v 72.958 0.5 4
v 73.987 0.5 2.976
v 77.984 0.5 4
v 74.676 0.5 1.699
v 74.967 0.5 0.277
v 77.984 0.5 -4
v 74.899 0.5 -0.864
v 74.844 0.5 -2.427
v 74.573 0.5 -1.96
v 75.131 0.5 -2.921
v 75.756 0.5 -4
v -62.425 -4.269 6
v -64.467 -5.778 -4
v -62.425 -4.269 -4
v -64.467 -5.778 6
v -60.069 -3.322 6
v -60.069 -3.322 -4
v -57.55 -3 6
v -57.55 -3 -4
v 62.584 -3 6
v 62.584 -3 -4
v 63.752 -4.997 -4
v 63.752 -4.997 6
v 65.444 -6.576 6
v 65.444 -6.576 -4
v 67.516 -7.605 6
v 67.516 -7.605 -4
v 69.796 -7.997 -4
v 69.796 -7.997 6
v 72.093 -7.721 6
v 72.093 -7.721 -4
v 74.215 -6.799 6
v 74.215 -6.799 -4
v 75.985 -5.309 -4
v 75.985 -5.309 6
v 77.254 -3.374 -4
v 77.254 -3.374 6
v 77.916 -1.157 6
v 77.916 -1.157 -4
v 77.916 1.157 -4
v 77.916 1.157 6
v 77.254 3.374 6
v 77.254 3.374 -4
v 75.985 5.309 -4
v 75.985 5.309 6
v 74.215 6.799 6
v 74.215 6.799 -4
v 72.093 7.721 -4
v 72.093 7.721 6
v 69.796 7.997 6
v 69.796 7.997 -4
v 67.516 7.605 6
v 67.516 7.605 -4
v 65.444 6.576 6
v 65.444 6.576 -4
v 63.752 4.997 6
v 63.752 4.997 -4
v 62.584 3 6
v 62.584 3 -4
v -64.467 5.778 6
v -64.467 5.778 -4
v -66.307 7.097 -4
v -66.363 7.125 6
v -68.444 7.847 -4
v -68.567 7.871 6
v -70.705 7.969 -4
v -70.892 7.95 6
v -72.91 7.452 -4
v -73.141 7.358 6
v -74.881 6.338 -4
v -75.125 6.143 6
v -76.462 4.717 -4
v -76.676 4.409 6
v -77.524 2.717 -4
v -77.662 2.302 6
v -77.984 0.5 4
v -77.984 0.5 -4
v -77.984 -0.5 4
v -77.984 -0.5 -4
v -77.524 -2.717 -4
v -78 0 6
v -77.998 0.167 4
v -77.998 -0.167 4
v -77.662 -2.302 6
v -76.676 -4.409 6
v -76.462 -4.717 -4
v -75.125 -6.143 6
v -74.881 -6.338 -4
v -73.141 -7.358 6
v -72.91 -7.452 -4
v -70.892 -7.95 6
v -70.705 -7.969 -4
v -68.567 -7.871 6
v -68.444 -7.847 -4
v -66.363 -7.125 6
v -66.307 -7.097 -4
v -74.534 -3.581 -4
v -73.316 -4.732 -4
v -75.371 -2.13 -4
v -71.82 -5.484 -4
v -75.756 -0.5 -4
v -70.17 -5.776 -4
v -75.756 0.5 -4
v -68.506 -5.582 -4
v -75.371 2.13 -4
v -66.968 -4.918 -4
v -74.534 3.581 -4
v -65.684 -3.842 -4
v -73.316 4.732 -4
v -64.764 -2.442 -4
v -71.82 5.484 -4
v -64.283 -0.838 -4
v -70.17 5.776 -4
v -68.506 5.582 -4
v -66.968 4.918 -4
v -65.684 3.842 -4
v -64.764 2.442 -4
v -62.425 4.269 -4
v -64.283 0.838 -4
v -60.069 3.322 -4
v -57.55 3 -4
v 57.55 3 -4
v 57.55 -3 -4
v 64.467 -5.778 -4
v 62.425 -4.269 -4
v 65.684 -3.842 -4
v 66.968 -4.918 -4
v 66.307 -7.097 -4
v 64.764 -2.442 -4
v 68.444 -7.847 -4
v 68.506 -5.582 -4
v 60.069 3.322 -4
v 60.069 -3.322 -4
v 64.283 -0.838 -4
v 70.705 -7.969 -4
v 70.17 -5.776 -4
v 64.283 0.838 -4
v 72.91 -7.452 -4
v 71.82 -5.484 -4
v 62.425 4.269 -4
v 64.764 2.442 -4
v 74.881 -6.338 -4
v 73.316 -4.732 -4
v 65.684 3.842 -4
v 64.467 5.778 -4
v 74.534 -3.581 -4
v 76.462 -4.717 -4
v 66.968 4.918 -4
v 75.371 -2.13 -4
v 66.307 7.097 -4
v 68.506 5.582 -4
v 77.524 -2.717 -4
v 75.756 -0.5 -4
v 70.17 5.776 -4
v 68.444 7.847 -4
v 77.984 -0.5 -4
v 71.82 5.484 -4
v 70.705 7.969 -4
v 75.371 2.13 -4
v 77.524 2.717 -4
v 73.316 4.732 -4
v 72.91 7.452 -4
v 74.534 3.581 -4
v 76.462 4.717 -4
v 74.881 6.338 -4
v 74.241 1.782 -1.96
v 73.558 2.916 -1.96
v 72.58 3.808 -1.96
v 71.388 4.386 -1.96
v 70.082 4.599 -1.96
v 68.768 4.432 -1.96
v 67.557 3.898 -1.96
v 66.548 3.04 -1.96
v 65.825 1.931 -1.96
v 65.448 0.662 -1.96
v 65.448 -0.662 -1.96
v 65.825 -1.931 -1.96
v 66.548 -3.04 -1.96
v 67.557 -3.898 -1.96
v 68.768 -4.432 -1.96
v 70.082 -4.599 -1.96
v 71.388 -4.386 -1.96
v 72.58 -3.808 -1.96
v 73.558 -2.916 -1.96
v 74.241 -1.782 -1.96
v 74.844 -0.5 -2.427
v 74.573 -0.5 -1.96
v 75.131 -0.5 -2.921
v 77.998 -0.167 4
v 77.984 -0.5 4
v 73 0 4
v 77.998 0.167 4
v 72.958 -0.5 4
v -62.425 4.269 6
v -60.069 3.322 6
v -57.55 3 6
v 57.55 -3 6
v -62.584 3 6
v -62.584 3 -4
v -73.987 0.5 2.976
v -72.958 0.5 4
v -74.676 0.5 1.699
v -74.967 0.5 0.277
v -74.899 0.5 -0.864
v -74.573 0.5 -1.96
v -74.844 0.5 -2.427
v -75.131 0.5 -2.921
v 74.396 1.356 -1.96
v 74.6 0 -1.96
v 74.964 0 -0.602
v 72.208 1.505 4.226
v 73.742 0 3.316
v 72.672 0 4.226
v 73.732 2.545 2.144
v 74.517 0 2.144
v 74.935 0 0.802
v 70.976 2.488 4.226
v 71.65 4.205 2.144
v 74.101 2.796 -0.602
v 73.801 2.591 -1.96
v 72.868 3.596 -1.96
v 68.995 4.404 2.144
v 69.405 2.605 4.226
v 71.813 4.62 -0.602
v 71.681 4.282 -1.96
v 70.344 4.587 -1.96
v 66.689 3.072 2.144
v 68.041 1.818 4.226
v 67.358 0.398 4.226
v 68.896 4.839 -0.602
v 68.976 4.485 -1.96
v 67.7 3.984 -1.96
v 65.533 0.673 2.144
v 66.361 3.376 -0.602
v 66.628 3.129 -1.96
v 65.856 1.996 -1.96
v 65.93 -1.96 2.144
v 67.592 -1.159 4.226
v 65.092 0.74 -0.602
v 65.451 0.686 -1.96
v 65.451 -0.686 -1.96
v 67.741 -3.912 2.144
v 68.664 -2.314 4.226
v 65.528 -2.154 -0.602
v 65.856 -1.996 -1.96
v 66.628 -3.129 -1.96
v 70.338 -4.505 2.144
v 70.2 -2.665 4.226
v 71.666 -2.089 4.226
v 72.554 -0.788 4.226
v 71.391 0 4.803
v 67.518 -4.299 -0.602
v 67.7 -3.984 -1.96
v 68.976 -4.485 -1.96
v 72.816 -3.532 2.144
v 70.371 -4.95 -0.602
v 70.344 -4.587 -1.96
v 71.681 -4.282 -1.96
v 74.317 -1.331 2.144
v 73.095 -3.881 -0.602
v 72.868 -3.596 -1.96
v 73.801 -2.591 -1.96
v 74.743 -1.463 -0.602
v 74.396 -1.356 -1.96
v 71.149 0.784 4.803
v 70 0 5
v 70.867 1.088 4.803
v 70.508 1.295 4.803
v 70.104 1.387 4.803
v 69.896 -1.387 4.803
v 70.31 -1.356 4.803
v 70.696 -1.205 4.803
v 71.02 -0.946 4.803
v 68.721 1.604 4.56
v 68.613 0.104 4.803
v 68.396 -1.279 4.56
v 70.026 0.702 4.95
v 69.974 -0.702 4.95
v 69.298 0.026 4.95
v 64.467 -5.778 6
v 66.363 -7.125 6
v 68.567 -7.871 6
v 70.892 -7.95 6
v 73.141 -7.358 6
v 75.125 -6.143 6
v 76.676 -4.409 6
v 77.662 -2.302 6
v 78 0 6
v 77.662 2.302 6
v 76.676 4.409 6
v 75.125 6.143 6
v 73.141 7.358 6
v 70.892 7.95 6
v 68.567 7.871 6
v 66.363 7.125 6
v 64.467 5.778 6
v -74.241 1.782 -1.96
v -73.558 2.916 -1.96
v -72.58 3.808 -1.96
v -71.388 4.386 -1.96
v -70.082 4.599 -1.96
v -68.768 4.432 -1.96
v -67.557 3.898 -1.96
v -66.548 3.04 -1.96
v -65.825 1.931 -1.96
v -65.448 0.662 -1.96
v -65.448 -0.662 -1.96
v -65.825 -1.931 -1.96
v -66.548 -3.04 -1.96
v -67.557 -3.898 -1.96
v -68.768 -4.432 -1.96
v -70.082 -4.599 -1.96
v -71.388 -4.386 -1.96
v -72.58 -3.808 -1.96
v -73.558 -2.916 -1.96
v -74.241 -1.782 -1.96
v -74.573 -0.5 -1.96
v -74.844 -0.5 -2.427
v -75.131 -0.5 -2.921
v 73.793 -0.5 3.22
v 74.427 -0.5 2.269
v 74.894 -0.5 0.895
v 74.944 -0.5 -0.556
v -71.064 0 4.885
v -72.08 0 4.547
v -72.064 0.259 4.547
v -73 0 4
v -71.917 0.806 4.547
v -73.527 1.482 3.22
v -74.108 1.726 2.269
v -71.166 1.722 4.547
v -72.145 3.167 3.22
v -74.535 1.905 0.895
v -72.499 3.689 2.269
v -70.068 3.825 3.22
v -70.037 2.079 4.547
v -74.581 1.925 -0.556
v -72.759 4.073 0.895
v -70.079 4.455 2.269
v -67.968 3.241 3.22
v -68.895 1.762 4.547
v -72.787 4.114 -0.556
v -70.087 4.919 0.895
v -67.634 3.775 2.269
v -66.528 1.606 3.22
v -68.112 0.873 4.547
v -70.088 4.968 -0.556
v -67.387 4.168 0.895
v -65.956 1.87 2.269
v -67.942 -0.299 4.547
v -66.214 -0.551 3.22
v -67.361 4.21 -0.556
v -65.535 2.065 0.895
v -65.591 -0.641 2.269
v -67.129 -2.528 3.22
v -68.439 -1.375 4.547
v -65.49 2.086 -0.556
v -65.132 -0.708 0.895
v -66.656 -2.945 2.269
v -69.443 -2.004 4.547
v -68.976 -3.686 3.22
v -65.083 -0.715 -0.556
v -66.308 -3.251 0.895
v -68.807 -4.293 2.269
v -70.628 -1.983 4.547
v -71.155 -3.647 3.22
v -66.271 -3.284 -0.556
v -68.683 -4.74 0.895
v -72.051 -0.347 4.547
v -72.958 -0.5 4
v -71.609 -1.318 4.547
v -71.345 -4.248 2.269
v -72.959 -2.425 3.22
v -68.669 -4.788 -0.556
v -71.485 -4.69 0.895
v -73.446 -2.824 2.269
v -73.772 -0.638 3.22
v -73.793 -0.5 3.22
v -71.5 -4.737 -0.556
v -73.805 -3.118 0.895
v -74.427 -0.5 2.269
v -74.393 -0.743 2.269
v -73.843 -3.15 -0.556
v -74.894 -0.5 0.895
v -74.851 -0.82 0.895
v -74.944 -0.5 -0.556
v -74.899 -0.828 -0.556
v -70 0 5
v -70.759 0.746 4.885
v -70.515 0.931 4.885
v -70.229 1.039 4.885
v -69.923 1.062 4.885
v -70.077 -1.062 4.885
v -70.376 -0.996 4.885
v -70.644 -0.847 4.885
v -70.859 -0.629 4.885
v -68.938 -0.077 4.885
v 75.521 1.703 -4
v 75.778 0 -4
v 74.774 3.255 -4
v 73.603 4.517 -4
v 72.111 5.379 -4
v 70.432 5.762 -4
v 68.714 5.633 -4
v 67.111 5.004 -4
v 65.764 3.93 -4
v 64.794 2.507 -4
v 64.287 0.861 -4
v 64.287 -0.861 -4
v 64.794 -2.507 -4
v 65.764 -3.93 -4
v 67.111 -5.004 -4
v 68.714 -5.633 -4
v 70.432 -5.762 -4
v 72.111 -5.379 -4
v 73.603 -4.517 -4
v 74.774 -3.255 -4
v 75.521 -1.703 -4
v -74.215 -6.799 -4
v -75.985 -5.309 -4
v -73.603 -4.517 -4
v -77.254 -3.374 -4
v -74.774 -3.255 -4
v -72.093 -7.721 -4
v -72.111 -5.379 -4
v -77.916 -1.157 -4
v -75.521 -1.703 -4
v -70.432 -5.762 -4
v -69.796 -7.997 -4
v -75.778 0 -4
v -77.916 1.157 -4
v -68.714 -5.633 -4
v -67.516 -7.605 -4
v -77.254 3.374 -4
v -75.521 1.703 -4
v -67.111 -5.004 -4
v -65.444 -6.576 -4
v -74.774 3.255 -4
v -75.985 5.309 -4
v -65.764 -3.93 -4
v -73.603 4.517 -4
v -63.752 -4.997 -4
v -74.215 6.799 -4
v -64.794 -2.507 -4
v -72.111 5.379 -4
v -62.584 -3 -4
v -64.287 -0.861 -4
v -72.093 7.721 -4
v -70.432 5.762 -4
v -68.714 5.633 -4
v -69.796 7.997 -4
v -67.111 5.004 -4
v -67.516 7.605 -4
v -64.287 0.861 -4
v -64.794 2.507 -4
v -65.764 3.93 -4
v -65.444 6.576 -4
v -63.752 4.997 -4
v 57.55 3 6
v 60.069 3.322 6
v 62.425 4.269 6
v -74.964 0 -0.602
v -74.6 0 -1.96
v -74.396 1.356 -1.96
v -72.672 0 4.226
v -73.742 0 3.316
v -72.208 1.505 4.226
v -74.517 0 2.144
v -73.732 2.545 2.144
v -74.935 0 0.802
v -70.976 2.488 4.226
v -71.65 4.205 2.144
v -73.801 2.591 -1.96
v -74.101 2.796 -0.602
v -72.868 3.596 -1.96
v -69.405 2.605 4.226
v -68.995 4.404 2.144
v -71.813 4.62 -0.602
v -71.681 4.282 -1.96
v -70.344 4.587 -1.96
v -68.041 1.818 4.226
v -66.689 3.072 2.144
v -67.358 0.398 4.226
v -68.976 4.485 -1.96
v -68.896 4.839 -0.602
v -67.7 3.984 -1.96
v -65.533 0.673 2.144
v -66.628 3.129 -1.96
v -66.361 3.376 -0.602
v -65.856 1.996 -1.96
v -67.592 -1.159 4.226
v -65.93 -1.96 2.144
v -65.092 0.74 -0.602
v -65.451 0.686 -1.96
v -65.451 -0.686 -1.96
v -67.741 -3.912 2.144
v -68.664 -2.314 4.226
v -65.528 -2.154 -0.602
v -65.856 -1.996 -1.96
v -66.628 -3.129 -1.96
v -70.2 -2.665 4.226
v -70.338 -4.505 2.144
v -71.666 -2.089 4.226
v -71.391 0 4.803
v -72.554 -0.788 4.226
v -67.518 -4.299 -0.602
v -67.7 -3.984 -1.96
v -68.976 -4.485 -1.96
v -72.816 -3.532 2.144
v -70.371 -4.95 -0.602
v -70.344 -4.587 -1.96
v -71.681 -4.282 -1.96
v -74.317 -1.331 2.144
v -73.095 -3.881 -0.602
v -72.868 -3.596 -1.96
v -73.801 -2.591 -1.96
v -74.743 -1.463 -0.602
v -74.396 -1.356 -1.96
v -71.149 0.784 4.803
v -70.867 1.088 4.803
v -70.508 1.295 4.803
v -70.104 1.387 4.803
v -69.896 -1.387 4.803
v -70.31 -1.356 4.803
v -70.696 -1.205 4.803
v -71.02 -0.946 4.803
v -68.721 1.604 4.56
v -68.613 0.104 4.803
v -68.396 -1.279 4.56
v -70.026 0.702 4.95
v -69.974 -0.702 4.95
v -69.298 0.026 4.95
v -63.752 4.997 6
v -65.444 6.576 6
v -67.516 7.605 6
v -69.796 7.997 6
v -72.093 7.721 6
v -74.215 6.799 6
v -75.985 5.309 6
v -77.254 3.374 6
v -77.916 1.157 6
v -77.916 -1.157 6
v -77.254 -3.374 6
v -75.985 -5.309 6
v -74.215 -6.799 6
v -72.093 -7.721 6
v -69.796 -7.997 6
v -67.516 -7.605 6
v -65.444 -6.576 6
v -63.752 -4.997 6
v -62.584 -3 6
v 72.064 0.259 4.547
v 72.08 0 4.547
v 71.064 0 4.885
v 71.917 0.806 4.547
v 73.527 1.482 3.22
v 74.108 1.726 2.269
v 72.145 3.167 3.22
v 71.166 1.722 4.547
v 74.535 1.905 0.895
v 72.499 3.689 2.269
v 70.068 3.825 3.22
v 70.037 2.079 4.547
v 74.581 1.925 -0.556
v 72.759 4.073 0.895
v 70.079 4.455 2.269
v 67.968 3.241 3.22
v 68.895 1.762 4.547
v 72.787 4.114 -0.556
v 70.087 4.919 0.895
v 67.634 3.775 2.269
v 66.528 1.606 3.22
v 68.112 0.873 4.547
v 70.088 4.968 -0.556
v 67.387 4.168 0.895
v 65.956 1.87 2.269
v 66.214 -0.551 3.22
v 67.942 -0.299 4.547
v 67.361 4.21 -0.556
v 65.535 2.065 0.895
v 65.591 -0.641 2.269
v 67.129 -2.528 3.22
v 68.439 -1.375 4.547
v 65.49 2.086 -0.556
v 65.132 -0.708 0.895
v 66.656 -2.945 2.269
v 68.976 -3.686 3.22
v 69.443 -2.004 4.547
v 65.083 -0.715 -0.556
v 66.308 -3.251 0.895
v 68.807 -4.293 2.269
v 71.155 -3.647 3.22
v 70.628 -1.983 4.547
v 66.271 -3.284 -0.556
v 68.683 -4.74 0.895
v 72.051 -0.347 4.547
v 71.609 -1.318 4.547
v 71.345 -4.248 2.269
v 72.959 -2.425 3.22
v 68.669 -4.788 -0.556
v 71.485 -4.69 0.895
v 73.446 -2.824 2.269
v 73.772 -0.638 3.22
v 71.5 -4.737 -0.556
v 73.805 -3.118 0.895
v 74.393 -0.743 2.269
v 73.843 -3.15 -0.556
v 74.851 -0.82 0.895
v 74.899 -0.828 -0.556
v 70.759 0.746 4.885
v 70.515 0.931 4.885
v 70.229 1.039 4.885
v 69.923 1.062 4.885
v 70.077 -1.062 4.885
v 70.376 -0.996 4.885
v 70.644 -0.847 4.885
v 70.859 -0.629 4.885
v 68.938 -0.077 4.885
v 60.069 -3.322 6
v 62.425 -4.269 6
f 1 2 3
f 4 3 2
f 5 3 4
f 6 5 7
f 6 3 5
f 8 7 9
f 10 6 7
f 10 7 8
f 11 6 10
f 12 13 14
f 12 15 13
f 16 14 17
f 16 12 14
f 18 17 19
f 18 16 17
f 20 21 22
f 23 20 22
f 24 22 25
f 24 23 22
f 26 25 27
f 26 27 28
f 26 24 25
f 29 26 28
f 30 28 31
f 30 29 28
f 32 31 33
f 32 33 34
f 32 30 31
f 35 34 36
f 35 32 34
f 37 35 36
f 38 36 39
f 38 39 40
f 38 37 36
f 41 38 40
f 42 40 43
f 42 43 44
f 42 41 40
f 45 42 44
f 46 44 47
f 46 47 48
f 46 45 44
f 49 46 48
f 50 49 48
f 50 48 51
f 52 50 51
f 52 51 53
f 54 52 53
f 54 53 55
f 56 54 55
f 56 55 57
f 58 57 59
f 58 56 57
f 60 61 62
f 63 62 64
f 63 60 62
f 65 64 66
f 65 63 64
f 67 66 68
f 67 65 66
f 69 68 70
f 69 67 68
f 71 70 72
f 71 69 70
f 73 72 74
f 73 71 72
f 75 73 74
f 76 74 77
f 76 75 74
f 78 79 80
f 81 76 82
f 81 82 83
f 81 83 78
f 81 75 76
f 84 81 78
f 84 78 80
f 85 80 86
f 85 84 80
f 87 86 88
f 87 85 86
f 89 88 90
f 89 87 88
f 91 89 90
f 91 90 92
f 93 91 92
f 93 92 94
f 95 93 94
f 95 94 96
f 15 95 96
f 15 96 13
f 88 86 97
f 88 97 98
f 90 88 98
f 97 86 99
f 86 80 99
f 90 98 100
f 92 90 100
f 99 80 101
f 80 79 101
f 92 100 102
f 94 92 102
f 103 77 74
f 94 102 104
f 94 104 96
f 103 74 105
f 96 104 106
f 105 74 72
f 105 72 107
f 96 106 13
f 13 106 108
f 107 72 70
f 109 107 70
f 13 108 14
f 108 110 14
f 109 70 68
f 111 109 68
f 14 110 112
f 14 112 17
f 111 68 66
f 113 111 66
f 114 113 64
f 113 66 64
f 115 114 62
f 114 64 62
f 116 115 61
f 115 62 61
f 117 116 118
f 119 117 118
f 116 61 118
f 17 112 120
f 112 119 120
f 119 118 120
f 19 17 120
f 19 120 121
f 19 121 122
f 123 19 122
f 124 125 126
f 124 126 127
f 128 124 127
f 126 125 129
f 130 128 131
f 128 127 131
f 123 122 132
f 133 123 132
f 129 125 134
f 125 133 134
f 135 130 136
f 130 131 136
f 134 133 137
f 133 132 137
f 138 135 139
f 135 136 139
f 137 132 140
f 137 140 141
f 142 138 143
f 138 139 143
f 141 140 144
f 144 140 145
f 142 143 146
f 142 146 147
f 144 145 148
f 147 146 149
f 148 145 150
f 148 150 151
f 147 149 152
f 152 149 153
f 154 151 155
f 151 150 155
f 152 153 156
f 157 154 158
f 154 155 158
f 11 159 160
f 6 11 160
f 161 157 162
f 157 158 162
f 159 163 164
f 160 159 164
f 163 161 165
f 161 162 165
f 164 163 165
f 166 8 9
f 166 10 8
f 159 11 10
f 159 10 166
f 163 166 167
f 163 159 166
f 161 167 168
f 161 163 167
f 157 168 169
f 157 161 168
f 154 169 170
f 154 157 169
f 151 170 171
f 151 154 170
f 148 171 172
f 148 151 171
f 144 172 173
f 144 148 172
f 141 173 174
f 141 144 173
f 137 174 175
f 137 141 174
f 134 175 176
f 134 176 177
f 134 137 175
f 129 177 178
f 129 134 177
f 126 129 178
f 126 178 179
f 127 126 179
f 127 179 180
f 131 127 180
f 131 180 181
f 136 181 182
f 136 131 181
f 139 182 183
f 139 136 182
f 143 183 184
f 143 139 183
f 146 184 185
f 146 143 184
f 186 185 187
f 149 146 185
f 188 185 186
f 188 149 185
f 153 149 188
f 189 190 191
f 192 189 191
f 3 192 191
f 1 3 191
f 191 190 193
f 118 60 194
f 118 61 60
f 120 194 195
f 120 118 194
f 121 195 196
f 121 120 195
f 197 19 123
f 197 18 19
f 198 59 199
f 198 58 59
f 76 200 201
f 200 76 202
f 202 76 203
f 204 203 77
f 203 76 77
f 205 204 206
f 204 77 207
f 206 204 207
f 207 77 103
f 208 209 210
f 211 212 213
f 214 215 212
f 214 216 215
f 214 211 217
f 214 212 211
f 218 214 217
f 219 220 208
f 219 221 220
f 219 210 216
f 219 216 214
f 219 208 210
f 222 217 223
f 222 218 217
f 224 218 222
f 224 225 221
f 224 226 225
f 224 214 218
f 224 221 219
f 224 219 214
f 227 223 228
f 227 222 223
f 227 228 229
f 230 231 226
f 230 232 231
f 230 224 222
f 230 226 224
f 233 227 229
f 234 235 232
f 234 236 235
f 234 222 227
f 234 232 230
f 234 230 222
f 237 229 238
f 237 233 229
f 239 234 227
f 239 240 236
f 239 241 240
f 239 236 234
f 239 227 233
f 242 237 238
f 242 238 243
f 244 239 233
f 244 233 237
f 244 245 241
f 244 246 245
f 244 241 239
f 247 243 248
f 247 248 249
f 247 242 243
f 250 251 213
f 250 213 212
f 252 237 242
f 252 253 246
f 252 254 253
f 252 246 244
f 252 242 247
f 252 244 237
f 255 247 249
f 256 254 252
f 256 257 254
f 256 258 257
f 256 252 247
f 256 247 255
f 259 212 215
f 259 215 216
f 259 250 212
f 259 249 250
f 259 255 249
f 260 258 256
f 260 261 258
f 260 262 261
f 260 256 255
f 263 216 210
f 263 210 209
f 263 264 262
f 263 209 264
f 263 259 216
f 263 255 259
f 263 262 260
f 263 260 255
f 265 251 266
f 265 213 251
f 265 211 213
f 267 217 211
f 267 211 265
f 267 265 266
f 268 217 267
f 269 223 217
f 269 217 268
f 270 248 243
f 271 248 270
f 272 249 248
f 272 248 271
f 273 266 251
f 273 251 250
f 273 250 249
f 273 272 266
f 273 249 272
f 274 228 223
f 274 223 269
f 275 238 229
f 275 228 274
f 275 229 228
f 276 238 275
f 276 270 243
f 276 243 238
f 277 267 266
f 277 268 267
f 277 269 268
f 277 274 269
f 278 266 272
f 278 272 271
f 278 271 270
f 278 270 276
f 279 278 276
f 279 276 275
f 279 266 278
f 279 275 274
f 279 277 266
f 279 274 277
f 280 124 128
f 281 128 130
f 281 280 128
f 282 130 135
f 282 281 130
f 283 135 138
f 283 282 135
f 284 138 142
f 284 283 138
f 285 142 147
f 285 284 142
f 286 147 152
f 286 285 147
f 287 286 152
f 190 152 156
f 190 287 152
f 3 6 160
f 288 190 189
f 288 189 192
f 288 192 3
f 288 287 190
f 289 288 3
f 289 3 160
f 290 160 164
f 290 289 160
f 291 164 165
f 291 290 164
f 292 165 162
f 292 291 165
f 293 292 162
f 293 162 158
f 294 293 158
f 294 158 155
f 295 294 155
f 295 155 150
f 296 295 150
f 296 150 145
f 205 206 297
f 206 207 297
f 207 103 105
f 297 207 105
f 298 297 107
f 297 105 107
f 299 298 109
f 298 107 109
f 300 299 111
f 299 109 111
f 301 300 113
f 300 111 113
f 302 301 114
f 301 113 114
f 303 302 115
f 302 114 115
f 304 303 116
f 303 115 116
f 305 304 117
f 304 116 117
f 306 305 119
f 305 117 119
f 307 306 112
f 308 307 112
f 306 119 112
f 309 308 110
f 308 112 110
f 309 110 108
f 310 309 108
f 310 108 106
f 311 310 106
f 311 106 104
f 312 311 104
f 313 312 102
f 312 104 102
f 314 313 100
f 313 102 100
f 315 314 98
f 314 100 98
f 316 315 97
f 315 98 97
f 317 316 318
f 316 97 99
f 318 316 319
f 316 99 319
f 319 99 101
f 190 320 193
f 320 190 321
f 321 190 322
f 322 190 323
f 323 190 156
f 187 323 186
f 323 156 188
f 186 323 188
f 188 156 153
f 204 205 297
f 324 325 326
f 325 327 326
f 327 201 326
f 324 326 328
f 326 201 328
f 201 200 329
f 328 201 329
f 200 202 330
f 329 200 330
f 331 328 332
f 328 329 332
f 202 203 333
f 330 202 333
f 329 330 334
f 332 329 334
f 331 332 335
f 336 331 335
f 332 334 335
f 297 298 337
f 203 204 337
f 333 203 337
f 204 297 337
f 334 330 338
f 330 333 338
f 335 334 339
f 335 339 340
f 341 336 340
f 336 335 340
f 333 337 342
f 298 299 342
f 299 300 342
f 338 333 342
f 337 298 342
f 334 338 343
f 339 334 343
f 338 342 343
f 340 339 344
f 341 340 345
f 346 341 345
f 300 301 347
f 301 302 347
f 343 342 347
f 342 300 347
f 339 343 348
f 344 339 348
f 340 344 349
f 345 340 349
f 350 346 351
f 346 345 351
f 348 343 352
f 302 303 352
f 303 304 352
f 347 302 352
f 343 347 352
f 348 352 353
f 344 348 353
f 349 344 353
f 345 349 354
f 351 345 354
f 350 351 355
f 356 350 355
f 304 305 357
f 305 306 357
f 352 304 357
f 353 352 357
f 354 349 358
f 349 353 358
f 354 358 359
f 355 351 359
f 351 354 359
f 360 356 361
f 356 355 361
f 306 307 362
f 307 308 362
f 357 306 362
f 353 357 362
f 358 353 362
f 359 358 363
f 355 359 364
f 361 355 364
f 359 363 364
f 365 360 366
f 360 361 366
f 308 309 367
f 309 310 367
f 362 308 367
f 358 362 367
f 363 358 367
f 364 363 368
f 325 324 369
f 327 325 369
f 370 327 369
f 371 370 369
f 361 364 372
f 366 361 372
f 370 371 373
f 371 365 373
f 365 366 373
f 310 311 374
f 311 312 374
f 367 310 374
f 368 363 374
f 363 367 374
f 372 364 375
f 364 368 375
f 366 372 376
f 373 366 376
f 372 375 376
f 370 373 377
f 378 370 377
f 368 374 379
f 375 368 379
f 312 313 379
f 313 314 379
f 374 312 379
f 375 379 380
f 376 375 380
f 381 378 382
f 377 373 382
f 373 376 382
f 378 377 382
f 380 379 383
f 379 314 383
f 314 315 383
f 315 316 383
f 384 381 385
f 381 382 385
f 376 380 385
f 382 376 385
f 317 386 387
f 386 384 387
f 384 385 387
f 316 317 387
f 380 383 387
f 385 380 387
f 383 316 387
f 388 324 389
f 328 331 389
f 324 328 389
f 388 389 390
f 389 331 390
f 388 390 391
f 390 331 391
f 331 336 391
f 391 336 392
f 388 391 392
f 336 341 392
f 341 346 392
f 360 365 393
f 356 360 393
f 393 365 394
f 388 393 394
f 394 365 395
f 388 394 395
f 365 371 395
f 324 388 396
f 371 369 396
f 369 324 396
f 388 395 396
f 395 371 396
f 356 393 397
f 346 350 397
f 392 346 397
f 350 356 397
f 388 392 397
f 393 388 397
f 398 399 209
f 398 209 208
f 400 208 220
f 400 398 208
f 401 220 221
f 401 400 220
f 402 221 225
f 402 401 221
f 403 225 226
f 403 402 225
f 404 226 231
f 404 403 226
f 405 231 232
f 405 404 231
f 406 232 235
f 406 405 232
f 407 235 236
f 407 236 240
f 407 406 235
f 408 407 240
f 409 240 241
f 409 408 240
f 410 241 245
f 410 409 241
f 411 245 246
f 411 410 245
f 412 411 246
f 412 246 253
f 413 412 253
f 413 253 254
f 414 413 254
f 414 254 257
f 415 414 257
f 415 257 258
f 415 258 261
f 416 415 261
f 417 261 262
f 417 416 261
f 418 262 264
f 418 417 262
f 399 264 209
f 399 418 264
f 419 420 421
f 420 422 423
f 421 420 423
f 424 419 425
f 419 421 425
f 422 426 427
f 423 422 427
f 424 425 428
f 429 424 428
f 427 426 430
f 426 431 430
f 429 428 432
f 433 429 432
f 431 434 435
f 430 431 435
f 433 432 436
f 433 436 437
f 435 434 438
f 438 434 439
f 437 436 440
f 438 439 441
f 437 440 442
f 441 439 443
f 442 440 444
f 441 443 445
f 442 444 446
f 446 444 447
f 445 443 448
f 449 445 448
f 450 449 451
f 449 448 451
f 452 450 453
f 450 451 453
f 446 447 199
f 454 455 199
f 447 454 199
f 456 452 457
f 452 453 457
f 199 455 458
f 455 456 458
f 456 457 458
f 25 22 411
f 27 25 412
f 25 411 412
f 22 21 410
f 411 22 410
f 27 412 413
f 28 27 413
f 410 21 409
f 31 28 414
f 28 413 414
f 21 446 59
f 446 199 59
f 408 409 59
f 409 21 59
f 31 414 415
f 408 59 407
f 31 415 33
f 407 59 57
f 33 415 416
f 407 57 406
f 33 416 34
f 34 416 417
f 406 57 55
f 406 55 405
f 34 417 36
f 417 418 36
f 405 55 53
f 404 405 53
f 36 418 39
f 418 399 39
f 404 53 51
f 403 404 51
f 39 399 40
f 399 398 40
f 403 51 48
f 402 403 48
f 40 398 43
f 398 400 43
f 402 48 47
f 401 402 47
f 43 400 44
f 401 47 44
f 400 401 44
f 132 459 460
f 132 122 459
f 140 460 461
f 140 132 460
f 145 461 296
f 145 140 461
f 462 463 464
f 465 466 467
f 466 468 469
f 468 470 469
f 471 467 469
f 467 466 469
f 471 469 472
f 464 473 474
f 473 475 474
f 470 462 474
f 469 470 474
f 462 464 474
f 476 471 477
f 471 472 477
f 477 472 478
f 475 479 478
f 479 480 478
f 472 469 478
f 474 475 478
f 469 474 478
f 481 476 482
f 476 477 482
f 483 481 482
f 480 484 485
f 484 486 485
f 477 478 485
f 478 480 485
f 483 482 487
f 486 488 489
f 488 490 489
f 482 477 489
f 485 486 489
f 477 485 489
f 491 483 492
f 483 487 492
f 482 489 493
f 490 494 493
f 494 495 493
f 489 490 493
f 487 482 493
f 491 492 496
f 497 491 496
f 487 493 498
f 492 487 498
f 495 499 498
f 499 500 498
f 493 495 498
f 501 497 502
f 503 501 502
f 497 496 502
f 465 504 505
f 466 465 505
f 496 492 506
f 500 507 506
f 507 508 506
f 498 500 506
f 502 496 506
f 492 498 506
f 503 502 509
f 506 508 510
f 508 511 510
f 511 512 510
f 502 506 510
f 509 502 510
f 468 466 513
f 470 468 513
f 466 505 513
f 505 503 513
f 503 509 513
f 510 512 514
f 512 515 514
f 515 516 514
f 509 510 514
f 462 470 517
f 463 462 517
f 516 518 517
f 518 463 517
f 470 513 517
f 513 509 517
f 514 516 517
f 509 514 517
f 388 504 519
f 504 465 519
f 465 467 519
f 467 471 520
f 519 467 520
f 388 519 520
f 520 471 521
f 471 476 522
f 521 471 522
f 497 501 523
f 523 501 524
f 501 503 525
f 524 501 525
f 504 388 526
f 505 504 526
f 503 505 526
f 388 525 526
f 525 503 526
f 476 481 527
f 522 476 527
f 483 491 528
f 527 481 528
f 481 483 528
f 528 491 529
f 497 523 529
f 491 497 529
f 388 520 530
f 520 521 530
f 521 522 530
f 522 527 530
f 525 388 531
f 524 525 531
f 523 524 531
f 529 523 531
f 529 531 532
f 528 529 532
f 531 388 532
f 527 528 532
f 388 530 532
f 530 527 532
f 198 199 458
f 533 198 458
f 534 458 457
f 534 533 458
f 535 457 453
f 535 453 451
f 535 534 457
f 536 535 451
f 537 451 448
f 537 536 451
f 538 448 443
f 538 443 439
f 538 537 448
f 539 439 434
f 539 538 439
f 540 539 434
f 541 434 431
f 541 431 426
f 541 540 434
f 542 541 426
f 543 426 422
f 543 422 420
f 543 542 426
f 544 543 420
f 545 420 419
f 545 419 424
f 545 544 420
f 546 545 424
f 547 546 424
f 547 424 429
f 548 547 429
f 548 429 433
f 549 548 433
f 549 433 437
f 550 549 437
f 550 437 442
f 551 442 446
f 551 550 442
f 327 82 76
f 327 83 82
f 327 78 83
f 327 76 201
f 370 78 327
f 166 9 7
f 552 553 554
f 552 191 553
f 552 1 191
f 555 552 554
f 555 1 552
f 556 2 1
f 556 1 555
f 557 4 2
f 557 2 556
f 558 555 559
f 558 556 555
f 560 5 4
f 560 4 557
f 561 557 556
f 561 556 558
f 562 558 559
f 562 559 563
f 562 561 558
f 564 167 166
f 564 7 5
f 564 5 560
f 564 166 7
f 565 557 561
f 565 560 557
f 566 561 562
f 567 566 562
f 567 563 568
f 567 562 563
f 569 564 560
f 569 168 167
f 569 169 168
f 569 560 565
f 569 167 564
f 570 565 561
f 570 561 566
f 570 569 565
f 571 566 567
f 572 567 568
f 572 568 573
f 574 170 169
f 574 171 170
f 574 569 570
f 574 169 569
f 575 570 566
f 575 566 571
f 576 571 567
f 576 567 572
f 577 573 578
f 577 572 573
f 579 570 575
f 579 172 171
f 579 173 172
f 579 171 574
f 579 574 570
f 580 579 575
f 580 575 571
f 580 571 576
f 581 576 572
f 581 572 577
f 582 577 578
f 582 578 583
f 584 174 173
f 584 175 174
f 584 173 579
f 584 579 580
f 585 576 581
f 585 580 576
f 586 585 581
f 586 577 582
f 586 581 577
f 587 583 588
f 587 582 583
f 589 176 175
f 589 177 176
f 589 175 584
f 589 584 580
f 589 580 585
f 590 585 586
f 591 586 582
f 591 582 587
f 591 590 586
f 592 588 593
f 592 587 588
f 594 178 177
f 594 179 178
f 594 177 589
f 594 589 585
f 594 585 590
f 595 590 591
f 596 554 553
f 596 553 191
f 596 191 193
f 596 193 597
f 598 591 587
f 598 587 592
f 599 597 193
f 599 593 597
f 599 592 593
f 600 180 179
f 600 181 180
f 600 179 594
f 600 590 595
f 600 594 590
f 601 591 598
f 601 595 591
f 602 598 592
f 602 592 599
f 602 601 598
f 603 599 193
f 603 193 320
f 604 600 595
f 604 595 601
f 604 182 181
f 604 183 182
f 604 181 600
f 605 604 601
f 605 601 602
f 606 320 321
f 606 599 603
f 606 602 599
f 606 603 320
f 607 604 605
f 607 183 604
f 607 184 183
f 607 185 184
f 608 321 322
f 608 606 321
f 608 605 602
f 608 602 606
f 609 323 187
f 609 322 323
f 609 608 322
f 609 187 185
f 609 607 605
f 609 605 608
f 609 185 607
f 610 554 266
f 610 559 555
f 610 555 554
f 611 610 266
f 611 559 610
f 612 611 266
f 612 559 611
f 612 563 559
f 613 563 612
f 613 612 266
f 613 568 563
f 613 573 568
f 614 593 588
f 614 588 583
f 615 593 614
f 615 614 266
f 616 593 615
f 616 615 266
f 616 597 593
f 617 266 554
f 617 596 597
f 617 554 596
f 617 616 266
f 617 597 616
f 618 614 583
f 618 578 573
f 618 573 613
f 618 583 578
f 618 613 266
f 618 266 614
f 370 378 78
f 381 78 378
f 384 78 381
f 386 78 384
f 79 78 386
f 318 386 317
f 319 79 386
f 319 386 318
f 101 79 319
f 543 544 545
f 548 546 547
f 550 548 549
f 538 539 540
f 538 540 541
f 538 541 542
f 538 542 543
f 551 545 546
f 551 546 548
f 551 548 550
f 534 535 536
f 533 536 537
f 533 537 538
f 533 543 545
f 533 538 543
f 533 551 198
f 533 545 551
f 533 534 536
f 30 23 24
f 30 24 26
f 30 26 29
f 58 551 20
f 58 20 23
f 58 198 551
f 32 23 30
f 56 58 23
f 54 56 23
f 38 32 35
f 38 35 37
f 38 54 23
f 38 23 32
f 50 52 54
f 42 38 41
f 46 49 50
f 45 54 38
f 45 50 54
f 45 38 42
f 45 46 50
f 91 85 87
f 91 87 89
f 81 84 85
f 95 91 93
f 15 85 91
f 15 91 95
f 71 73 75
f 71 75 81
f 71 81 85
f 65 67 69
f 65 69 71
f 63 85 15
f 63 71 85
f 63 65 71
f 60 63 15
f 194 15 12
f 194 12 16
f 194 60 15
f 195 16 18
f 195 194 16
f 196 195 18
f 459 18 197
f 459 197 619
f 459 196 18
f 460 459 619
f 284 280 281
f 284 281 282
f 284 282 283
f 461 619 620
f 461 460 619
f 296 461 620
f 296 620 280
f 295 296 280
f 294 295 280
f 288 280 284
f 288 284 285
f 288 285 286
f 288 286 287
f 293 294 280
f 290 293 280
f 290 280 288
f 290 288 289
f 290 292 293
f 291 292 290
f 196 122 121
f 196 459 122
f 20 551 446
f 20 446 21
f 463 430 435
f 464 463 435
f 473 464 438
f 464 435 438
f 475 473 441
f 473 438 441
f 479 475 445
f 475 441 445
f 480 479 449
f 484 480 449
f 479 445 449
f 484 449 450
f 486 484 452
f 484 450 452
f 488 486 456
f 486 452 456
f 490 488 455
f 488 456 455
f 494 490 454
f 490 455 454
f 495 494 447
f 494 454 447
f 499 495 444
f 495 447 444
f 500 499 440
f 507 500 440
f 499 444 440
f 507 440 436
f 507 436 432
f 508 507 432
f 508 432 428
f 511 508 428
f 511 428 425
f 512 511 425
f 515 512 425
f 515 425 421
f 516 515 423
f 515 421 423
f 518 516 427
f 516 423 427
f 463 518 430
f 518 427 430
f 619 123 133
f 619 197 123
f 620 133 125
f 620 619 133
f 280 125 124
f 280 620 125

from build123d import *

# Parameters (mm, degrees)
PAD_DEPTH         = 6
PAD_DEPTH_BACK    = 4
PAD001_DEPTH      = 6
PAD001_DEPTH_BACK = 4
SKETCH005_W       = 10
SKETCH005_H       = 1
POCKET_DEPTH      = 8
FILLET_R          = 10


with BuildPart() as link_skel:
    # Sketch → Pad (new body, two sides)
    with BuildSketch(Plane.XY) as pad_sk:
        with BuildLine():
            ThreePointArc((-62.583802, 3), (-78, 0), (-62.583802, -3))
            Line((-62.583802, -3), (62.583802, -3))
            ThreePointArc((62.583802, -3), (78, 0), (62.583802, 3))
            Line((62.583802, 3), (-62.583802, 3))
        make_face()
    extrude(amount=PAD_DEPTH)
    extrude(pad_sk.sketch, amount=-PAD_DEPTH_BACK)

    # Sketch001 → Groove (revolve, cut)
    with BuildSketch(Plane.XZ):
        with BuildLine():
            ThreePointArc((-70, 5), (-74.171208, 2.756995), (-74.6, -1.959592))
            Line((-74.6, -1.959592), (-79.242132, -10))
            Line((-79.242132, -10), (-70, -10))
            Line((-70, 5), (-70, -10))
        make_face()
    groove = revolve(axis=Axis((-70, 0, 5), (0, 0, -1)), mode=Mode.SUBTRACT)

    # Mirrored: Groove across Sketch001 V_Axis
    add(groove.mirror(Plane(origin=(0, 0, 0), x_dir=(0, -1, 0), z_dir=(1, 0, 0))), mode=Mode.SUBTRACT)


with BuildPart() as link0:
    # Sketch003 → Pad001 (new body, two sides)
    with BuildSketch(Plane.XY) as pad001_sk:
        with BuildLine():
            ThreePointArc((-62.583802, 3), (-78, 0), (-62.583802, -3))
            Line((-62.583802, -3), (62.583802, -3))
            ThreePointArc((62.583802, -3), (78, 0), (62.583802, 3))
            Line((62.583802, 3), (-62.583802, 3))
        make_face()
    extrude(amount=PAD001_DEPTH)
    extrude(pad001_sk.sketch, amount=-PAD001_DEPTH_BACK)

    # Sketch004 → Groove001 (revolve, cut)
    with BuildSketch(Plane.XZ):
        with BuildLine():
            ThreePointArc((-70, 5), (-74.171208, 2.756995), (-74.6, -1.959592))
            Line((-74.6, -1.959592), (-79.242132, -10))
            Line((-79.242132, -10), (-70, -10))
            Line((-70, 5), (-70, -10))
        make_face()
    groove001 = revolve(axis=Axis((-70, 0, 5), (0, 0, -1)), mode=Mode.SUBTRACT)

    # Sketch005 (on Face4 of Groove001) → Pocket (cut)
    with BuildSketch(Plane(origin=(0, 0, -4), x_dir=(1, 0, 0), z_dir=(0, 0, -1))):
        with Locations((-76, 0)):
            Rectangle(SKETCH005_W, SKETCH005_H)
    pocket = extrude(amount=-POCKET_DEPTH, mode=Mode.SUBTRACT)

    # Mirrored001: Pocket, Groove001 across Sketch005 V_Axis
    add(pocket.mirror(Plane(origin=(0, 0, -4), x_dir=(0, 0, -1), z_dir=(1, 0, 0))), mode=Mode.SUBTRACT)
    add(groove001.mirror(Plane(origin=(0, 0, -4), x_dir=(0, 0, -1), z_dir=(1, 0, 0))), mode=Mode.SUBTRACT)

    # Fillet
    fillet_edges = [link0.edges().sort_by_distance(p)[0] for p in [
        (-62.583802, -3, 1),
        (-62.583802, 3, 1),
        (62.583802, 3, 1),
        (62.583802, -3, 1),
    ]]
    fillet(fillet_edges, radius=FILLET_R)


solid = Compound([link_skel.part, link0.part])
